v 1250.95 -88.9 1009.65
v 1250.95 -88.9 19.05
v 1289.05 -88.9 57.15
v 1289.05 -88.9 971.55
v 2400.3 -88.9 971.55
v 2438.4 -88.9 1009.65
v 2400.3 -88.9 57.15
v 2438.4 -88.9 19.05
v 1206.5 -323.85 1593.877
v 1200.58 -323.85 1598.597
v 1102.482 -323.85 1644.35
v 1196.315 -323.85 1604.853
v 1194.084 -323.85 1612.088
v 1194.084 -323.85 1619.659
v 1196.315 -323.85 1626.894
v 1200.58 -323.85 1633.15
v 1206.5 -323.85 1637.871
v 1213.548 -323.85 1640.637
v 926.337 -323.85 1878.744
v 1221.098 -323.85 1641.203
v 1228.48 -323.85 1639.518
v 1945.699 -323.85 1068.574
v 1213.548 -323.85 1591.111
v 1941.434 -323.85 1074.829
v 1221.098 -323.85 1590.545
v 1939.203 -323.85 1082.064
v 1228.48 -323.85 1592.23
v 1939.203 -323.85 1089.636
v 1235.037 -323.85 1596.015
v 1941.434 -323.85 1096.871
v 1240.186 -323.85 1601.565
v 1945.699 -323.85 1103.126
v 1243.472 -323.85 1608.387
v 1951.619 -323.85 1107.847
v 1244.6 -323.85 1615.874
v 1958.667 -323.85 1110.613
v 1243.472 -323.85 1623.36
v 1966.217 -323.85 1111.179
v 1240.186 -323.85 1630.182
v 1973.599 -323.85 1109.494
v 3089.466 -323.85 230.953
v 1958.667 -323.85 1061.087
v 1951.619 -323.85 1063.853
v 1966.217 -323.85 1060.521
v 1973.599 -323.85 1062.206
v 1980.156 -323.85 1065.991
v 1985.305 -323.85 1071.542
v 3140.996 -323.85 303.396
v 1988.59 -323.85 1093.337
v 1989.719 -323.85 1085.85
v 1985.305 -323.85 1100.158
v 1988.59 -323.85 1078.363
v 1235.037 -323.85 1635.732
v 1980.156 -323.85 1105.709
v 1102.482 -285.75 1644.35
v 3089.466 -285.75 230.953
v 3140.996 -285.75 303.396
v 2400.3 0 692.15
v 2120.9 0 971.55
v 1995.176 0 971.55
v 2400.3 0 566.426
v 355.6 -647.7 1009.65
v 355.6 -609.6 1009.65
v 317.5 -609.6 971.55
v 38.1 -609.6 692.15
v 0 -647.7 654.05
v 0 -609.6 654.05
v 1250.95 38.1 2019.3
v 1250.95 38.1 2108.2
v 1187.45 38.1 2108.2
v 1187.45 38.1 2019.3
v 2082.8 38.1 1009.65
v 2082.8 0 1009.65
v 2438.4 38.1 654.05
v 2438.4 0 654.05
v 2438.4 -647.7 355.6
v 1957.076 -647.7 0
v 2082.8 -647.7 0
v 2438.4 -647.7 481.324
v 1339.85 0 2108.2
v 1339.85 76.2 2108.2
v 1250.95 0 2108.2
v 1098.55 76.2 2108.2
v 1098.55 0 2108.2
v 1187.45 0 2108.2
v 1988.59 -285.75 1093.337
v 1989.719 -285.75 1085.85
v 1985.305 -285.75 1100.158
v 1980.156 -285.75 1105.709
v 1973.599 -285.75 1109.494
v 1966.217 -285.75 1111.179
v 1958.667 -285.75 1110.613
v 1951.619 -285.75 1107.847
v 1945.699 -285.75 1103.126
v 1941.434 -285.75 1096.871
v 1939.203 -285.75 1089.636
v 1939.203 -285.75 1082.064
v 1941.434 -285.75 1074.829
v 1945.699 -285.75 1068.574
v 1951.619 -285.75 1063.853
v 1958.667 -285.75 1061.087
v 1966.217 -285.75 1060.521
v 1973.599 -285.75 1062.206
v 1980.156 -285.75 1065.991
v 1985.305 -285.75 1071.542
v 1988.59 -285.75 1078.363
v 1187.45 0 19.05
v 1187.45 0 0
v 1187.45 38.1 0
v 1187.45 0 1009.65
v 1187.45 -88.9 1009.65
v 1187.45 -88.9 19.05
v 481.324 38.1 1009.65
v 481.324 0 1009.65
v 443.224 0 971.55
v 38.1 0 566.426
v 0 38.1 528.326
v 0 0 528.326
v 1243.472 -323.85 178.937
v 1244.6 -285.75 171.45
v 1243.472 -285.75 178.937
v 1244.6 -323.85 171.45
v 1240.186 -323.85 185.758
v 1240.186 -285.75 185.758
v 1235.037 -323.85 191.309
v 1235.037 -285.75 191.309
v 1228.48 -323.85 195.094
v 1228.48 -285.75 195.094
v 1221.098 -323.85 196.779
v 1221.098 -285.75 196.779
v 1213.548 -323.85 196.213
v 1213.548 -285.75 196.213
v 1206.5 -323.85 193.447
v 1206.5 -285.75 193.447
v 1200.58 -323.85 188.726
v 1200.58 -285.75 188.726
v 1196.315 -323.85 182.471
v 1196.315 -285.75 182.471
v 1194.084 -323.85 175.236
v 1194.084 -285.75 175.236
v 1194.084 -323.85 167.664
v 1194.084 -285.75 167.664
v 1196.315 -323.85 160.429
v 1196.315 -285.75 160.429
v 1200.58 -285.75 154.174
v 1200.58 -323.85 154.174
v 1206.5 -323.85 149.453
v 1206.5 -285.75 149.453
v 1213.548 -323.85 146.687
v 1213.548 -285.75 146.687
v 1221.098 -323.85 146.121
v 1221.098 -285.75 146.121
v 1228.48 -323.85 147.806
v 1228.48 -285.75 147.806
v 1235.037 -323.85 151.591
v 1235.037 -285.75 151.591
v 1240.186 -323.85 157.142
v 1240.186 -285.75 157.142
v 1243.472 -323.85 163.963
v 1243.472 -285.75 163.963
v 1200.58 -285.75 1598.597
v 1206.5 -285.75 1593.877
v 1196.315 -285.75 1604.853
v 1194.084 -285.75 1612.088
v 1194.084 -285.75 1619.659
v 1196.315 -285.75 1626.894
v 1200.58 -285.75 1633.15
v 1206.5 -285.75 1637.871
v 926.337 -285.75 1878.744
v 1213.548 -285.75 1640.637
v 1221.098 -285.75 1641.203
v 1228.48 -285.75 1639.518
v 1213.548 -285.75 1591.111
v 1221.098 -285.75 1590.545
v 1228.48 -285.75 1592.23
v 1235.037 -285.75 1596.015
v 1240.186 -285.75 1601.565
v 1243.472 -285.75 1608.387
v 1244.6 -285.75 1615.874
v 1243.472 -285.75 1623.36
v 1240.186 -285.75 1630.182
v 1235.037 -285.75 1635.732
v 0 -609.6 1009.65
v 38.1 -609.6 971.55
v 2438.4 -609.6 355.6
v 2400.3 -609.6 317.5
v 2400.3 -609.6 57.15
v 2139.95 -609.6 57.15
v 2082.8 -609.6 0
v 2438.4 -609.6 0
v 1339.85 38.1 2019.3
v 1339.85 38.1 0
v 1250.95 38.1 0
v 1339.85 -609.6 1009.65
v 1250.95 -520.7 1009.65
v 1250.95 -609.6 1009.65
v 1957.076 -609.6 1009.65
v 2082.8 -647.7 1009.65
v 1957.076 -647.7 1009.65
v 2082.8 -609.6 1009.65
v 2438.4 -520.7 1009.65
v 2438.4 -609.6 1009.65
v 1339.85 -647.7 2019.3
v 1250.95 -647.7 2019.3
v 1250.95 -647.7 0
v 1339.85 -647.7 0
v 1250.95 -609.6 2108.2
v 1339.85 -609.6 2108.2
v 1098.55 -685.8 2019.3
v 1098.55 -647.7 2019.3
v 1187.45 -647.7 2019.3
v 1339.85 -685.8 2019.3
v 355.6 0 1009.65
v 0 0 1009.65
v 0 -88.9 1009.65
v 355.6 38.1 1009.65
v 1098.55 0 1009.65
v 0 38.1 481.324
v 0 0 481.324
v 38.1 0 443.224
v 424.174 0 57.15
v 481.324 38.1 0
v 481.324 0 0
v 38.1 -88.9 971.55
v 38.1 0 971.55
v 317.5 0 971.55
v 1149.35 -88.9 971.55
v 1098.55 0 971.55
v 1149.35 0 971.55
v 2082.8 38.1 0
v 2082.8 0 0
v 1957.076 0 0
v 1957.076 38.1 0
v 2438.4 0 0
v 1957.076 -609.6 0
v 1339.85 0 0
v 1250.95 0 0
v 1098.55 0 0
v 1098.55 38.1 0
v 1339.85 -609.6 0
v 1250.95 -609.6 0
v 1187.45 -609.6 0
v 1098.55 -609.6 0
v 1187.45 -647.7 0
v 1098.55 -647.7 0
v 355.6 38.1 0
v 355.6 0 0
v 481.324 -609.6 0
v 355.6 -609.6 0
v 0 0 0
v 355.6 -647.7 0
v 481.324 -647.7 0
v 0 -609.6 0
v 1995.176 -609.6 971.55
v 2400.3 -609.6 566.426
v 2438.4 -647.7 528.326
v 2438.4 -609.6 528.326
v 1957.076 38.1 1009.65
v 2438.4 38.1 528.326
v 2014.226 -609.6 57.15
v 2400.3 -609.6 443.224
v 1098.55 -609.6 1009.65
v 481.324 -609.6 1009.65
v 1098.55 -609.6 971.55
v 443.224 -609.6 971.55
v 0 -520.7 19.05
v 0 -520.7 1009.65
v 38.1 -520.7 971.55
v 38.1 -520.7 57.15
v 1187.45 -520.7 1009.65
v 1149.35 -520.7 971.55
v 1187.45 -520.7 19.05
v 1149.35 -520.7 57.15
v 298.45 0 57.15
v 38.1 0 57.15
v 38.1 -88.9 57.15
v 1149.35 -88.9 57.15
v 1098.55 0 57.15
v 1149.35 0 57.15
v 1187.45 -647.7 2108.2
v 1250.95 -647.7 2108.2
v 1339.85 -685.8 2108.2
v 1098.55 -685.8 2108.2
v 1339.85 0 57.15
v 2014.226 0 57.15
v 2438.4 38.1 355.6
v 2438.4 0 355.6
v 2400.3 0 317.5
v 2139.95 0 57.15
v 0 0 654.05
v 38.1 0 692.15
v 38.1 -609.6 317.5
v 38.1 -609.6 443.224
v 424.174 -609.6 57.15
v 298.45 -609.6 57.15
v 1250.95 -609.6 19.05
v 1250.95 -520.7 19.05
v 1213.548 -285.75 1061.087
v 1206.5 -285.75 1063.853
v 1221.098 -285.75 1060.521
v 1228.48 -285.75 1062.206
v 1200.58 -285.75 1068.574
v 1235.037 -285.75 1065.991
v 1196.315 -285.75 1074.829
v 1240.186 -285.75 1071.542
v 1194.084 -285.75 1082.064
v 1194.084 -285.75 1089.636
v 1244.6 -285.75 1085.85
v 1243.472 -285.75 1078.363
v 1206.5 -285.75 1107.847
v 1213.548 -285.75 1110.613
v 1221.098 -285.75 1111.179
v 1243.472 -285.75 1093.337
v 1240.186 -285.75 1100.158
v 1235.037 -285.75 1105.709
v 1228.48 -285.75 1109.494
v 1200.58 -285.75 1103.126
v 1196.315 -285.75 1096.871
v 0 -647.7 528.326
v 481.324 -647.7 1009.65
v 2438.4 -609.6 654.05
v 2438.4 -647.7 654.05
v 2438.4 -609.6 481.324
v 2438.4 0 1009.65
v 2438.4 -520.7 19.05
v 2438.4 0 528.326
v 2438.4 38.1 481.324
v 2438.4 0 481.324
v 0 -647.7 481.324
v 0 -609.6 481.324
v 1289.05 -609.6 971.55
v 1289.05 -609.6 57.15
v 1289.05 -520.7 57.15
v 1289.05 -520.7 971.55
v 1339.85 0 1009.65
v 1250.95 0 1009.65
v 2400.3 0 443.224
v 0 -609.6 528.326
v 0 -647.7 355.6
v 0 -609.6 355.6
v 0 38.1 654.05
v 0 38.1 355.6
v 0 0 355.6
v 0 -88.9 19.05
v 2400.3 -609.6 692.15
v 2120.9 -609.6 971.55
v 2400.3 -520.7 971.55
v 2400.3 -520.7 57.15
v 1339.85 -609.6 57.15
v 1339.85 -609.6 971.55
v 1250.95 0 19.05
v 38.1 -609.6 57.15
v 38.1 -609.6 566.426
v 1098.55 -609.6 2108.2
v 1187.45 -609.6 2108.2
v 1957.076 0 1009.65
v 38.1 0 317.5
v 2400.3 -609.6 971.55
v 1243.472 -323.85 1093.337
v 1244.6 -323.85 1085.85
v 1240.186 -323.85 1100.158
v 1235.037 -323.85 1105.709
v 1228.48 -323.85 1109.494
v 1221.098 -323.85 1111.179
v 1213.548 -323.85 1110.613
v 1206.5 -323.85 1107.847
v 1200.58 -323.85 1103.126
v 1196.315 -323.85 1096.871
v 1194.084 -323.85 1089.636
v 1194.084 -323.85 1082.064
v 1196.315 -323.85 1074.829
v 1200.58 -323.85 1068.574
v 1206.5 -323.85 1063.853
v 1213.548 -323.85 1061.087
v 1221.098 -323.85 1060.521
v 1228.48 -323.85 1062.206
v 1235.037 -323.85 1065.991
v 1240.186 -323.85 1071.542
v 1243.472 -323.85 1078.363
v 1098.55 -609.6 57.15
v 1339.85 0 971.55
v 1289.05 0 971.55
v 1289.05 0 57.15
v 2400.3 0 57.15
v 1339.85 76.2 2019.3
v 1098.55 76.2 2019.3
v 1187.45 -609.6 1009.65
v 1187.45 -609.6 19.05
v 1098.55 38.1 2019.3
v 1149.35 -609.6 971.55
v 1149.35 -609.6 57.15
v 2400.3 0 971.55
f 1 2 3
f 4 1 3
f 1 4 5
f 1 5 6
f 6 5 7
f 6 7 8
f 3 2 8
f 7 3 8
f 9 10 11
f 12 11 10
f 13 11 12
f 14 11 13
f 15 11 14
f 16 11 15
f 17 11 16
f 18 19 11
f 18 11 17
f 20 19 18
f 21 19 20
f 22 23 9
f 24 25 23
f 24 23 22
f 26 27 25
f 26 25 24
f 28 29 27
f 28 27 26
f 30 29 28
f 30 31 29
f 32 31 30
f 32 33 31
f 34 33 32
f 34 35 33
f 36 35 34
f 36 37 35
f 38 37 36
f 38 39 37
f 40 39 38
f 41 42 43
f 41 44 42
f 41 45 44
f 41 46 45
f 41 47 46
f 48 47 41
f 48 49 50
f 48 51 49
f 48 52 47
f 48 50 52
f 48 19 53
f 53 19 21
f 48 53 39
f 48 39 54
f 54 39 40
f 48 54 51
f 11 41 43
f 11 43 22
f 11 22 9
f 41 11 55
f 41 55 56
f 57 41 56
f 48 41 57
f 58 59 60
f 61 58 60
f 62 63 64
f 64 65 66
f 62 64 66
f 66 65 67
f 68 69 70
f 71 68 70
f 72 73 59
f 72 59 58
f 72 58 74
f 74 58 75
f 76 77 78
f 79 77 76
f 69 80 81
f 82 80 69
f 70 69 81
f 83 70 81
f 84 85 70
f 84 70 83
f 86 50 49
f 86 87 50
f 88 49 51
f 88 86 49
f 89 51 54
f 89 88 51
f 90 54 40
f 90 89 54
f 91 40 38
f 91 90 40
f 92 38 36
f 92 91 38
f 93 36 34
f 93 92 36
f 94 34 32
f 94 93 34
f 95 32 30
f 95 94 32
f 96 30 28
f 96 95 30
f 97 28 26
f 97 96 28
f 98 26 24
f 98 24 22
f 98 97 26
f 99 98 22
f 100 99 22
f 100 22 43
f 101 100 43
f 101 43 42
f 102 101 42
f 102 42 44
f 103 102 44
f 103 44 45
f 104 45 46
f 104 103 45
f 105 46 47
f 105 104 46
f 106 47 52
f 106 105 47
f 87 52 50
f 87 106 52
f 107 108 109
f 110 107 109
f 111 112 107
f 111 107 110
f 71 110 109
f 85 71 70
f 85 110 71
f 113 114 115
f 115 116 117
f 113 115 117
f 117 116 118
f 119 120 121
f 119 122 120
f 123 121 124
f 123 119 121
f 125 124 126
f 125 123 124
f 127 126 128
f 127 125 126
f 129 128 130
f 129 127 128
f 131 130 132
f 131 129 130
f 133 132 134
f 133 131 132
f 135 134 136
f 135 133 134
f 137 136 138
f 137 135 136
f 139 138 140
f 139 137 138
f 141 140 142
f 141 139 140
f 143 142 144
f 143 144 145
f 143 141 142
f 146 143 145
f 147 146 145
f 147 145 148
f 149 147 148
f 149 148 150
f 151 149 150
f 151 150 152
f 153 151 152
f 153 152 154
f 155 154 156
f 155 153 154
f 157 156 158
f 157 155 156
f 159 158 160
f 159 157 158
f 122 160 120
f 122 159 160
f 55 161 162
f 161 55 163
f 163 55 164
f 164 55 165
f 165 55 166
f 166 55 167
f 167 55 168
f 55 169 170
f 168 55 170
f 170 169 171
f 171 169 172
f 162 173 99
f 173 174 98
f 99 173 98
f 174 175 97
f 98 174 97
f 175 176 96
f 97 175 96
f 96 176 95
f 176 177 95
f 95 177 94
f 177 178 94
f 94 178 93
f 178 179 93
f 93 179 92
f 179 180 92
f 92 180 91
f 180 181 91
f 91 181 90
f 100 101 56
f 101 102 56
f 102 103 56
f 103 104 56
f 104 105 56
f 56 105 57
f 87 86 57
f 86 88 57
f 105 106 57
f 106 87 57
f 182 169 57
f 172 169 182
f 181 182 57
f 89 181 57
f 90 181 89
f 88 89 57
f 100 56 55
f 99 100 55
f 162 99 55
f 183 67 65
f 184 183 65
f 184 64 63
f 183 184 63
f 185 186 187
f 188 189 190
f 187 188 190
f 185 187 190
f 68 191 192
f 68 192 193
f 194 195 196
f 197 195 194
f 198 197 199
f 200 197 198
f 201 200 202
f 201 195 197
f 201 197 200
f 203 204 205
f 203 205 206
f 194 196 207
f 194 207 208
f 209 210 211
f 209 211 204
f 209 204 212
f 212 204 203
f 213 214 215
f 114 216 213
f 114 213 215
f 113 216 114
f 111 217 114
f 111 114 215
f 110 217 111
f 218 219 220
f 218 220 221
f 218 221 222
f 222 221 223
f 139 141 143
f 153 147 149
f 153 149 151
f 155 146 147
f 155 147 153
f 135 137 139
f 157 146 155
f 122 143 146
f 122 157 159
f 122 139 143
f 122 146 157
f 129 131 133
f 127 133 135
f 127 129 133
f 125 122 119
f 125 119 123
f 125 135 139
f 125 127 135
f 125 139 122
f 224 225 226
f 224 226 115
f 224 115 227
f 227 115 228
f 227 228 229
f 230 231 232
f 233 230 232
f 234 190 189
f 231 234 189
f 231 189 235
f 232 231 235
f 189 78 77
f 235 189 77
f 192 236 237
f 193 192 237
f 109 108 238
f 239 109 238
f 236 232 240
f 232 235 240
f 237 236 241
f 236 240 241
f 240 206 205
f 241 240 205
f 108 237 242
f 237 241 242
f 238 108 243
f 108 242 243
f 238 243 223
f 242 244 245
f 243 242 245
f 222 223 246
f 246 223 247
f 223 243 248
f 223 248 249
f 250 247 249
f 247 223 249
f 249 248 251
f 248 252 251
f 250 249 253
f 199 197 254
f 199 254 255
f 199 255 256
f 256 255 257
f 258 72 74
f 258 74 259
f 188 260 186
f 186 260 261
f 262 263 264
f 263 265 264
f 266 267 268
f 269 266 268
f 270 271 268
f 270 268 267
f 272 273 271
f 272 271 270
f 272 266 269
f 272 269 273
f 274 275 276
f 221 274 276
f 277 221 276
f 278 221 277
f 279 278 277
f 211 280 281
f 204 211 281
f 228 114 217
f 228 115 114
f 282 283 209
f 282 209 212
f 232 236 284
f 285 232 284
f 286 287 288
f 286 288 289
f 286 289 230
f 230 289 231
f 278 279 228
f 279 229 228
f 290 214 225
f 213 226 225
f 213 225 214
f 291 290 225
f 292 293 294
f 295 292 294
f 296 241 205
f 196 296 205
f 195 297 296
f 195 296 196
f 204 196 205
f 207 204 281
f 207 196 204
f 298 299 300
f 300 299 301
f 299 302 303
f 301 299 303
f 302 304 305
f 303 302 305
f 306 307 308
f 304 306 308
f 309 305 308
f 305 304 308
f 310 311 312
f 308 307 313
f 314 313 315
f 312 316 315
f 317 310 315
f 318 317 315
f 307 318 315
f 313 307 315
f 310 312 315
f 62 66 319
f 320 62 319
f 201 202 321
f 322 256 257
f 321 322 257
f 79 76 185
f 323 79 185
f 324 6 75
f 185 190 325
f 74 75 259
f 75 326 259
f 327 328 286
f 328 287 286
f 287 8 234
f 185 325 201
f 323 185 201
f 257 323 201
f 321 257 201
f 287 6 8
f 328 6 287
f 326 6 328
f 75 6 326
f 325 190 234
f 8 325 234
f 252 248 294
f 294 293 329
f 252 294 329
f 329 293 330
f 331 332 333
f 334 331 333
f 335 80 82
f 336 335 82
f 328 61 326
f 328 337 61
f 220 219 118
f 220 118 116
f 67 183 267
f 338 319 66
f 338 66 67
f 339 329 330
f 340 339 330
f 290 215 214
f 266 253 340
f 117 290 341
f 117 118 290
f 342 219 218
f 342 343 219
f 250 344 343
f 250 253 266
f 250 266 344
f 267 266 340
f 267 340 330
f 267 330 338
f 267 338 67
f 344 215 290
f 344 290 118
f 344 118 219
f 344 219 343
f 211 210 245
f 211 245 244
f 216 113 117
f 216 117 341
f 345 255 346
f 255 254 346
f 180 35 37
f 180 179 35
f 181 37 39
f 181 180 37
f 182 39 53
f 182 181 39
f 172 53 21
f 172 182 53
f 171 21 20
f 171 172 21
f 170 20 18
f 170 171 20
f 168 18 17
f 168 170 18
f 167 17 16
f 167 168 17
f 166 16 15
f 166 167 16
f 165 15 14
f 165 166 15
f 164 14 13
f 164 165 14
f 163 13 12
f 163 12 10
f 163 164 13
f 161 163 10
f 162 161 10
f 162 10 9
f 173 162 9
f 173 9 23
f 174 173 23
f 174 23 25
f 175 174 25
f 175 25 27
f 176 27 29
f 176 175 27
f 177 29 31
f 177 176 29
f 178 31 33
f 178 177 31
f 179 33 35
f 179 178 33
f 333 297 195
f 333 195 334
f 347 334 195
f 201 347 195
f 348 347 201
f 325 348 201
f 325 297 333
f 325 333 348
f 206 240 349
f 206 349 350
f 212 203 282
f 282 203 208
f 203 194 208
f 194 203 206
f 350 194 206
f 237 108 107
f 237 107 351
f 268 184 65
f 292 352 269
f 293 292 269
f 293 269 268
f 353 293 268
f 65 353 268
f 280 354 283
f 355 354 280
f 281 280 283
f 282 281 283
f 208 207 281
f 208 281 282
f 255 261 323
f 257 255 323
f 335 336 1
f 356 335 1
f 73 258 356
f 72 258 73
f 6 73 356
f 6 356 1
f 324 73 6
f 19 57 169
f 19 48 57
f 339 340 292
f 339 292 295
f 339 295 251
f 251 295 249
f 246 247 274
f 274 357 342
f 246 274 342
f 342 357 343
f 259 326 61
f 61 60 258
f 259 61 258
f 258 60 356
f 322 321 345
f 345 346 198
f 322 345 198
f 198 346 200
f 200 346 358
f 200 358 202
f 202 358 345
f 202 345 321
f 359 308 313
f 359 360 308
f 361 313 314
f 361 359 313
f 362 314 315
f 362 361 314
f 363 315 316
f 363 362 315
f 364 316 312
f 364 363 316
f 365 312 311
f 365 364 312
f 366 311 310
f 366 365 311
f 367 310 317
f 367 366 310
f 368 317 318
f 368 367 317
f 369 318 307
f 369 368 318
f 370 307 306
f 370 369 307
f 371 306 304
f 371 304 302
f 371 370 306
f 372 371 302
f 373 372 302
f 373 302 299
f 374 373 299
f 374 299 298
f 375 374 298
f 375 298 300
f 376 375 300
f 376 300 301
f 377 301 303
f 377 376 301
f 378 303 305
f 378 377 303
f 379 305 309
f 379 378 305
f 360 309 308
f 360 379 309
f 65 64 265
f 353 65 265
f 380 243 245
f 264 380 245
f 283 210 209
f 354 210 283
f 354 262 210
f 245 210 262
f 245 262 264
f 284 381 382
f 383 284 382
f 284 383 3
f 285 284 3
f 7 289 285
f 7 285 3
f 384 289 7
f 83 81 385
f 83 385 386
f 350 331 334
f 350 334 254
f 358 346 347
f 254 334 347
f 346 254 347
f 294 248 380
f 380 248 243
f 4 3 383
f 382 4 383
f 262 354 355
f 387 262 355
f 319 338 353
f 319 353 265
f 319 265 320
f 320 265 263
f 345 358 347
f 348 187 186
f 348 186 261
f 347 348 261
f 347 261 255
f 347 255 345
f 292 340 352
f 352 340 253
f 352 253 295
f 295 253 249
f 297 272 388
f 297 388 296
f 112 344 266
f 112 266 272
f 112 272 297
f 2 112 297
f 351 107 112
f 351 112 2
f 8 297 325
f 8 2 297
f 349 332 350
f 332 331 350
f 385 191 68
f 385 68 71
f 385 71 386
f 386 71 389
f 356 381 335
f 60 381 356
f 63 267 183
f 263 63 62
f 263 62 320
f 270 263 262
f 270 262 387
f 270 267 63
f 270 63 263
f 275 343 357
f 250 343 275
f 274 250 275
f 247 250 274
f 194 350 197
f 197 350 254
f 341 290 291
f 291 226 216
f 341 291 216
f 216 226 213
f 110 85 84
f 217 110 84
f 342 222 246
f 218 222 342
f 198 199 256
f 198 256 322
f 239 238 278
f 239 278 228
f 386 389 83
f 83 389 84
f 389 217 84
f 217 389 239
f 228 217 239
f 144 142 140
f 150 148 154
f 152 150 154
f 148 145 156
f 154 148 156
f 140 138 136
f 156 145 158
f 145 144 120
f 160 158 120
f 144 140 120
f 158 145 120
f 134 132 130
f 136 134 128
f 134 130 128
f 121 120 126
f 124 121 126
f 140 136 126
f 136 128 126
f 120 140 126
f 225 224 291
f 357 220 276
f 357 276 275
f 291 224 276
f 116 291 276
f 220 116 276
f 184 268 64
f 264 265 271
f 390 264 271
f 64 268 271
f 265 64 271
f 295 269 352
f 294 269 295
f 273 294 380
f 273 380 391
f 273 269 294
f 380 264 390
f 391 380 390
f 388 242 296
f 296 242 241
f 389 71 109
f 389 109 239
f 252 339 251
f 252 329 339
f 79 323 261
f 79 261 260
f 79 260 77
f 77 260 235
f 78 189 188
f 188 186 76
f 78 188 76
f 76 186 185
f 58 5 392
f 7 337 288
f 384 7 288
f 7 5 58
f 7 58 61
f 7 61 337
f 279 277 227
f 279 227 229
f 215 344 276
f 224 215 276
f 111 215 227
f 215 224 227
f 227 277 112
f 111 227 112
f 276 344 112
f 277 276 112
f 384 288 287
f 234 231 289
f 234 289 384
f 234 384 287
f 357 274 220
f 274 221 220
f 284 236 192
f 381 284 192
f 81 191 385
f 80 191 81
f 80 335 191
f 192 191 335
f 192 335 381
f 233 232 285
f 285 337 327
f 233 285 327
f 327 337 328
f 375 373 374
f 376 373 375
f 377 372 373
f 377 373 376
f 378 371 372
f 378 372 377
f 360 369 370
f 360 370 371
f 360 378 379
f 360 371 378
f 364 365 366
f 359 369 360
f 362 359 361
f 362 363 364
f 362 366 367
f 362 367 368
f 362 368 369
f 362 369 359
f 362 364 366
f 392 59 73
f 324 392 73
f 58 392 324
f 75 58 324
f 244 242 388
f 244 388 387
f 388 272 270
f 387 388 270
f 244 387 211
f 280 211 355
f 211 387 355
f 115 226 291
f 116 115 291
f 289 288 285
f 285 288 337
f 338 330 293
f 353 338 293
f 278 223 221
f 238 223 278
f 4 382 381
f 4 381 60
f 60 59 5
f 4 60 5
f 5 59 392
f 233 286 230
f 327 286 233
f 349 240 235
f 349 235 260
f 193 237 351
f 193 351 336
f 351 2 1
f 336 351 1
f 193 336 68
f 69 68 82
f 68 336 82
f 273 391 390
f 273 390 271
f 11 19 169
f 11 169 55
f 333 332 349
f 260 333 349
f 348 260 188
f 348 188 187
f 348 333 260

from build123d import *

# Parameters (mm, degrees)
F0_W      = 2438.4
F0_H      = 609.6
F1_DEPTH  = 19.05
F2_W      = 1187.45
F2_H      = 88.9
F3_DEPTH  = 38.1
F4_W      = 38.1
F4_H      = 88.9
F5_DEPTH  = 914.4
F6_W      = 1187.45
F6_H      = 88.9
F7_DEPTH  = 38.1
F8_W      = 88.9
F8_H      = 2108.2
F9_DEPTH  = 38.1
F10_W     = 88.9
F10_H     = 2108.2
F11_DEPTH = 38.1
F12_W     = 241.3
F12_H     = 88.9
F13_DEPTH = 38.1
F14_W     = 241.3
F14_H     = 88.9
F15_DEPTH = 38.1
F17_R     = 25.4
F18_DEPTH = 19.05


with BuildPart() as f1:
    # F0 (on Top) → F1 (new body)
    with BuildSketch(Plane.XY):
        with Locations((1219.2, -304.8)):
            Rectangle(F0_W, F0_H)
    extrude(amount=F1_DEPTH)

    # F2 (on face) → F3 (join)
    with BuildSketch(Plane.XY.offset(19.05)):
        with Locations((593.725, -44.45)):
            Rectangle(F2_W, F2_H)
        with Locations((1844.675, -44.45)):
            Rectangle(F2_W, F2_H)
        with Locations((593.725, -565.15)):
            Rectangle(F2_W, F2_H)
        with Locations((1844.675, -565.15)):
            Rectangle(F2_W, F2_H)
    extrude(amount=F3_DEPTH)

    # F4 (on face) → F5 (join)
    with BuildSketch(Plane.XY.offset(57.15)):
        with Locations((19.05, -44.45)):
            Rectangle(F4_W, F4_H)
        with Locations((1168.4, -44.45)):
            Rectangle(F4_W, F4_H)
        with Locations((1168.4, -565.15)):
            Rectangle(F4_W, F4_H)
        with Locations((19.05, -565.15)):
            Rectangle(F4_W, F4_H)
        with Locations((1270, -44.45)):
            Rectangle(F4_W, F4_H)
        with Locations((1270, -565.15)):
            Rectangle(F4_W, F4_H)
        with Locations((2419.35, -565.15)):
            Rectangle(F4_W, F4_H)
        with Locations((2419.35, -44.45)):
            Rectangle(F4_W, F4_H)
    extrude(amount=F5_DEPTH)

    # F6 (on face) → F7 (join)
    with BuildSketch(Plane.XY.offset(971.55)):
        with Locations((593.725, -44.45)):
            Rectangle(F6_W, F6_H)
        with Locations((1844.675, -44.45)):
            Rectangle(F6_W, F6_H)
        with Locations((1844.675, -565.15)):
            Rectangle(F6_W, F6_H)
        with Locations((593.725, -565.15)):
            Rectangle(F6_W, F6_H)
    extrude(amount=F7_DEPTH)

    # F8 (on face) → F9 (join)
    with BuildSketch(Plane.XZ.offset(609.6)):
        with Locations((1295.4, 1054.1)):
            Rectangle(F8_W, F8_H)
        Polygon((2438.4, 654.05), (2082.8, 1009.65), (1957.076414305, 1009.65), (2438.4, 528.326414305), align=None)
        Polygon((2438.4, 355.6), (2438.4, 481.323585695), (1957.076414305, 0), (2082.8, 0), align=None)
        Polygon((0, 355.6), (355.6, 0), (481.323585695, 0), (0, 481.323585695), align=None)
        Polygon((481.323585695, 1009.65), (355.6, 1009.65), (0, 654.05), (0, 528.326414305), align=None)
        with Locations((1143, 1054.1)):
            Rectangle(F8_W, F8_H)
    extrude(amount=F9_DEPTH)

    # F10 (on face) → F11 (join)
    with BuildSketch(Plane(origin=(0, 0, 0), x_dir=(-1, 0, 0), z_dir=(0, 1, 0))):
        with Locations((-1143, 1054.1)):
            Rectangle(F10_W, F10_H)
        Polygon((0, 654.05), (-355.6, 1009.65), (-481.323585695, 1009.65), (0, 528.326414305), align=None)
        Polygon((0, 355.6), (0, 481.323585695), (-481.323585695, 0), (-355.6, 0), align=None)
        Polygon((-2438.4, 355.6), (-2082.8, 0), (-1957.076414305, 0), (-2438.4, 481.323585695), align=None)
        Polygon((-1957.076414305, 1009.65), (-2082.8, 1009.65), (-2438.4, 654.05), (-2438.4, 528.326414305), align=None)
        with Locations((-1295.4, 1054.1)):
            Rectangle(F10_W, F10_H)
    extrude(amount=F11_DEPTH)

    # F12 (on face) → F13 (join)
    with BuildSketch(Plane(origin=(0, 38.1, 0), x_dir=(-1, 0, 0), z_dir=(0, 1, 0))):
        with Locations((-1219.2, 2063.75)):
            Rectangle(F12_W, F12_H)
    extrude(amount=F13_DEPTH)

    # F14 (on face) → F15 (join)
    with BuildSketch(Plane.XZ.offset(647.7)):
        with Locations((1219.2, 2063.75)):
            Rectangle(F14_W, F14_H)
    extrude(amount=F15_DEPTH)


with BuildPart() as f18:
    # F17 (on offset) → F18 (new body, symmetric)
    with BuildSketch(Plane.XZ.offset(304.8)):
        Polygon((3140.9959368845, 303.3955563917), (926.3368722694, 1878.7437932961), (1102.4820206955, 1644.3499864541), (3089.465854369, 230.9534374557), align=None)
        with Locations((1964.3189376275, 1085.85)):
            Circle(F17_R, mode=Mode.SUBTRACT)
        with Locations((1219.2, 1615.8737058744)):
            Circle(F17_R, mode=Mode.SUBTRACT)
    extrude(amount=F18_DEPTH, both=True)


with BuildPart() as f18b:
    # F17 (on offset) → F18, piece 2 (new body, symmetric)
    with BuildSketch(Plane.XZ.offset(304.8)):
        with Locations((1219.2, 1085.85)):
            Circle(F17_R)
    extrude(amount=F18_DEPTH, both=True)


with BuildPart() as f18c:
    # F17 (on offset) → F18, piece 3 (new body, symmetric)
    with BuildSketch(Plane.XZ.offset(304.8)):
        with Locations((1219.2, 171.45)):
            Circle(F17_R)
    extrude(amount=F18_DEPTH, both=True)


solid = Compound([f1.part, f18.part, f18b.part, f18c.part])
